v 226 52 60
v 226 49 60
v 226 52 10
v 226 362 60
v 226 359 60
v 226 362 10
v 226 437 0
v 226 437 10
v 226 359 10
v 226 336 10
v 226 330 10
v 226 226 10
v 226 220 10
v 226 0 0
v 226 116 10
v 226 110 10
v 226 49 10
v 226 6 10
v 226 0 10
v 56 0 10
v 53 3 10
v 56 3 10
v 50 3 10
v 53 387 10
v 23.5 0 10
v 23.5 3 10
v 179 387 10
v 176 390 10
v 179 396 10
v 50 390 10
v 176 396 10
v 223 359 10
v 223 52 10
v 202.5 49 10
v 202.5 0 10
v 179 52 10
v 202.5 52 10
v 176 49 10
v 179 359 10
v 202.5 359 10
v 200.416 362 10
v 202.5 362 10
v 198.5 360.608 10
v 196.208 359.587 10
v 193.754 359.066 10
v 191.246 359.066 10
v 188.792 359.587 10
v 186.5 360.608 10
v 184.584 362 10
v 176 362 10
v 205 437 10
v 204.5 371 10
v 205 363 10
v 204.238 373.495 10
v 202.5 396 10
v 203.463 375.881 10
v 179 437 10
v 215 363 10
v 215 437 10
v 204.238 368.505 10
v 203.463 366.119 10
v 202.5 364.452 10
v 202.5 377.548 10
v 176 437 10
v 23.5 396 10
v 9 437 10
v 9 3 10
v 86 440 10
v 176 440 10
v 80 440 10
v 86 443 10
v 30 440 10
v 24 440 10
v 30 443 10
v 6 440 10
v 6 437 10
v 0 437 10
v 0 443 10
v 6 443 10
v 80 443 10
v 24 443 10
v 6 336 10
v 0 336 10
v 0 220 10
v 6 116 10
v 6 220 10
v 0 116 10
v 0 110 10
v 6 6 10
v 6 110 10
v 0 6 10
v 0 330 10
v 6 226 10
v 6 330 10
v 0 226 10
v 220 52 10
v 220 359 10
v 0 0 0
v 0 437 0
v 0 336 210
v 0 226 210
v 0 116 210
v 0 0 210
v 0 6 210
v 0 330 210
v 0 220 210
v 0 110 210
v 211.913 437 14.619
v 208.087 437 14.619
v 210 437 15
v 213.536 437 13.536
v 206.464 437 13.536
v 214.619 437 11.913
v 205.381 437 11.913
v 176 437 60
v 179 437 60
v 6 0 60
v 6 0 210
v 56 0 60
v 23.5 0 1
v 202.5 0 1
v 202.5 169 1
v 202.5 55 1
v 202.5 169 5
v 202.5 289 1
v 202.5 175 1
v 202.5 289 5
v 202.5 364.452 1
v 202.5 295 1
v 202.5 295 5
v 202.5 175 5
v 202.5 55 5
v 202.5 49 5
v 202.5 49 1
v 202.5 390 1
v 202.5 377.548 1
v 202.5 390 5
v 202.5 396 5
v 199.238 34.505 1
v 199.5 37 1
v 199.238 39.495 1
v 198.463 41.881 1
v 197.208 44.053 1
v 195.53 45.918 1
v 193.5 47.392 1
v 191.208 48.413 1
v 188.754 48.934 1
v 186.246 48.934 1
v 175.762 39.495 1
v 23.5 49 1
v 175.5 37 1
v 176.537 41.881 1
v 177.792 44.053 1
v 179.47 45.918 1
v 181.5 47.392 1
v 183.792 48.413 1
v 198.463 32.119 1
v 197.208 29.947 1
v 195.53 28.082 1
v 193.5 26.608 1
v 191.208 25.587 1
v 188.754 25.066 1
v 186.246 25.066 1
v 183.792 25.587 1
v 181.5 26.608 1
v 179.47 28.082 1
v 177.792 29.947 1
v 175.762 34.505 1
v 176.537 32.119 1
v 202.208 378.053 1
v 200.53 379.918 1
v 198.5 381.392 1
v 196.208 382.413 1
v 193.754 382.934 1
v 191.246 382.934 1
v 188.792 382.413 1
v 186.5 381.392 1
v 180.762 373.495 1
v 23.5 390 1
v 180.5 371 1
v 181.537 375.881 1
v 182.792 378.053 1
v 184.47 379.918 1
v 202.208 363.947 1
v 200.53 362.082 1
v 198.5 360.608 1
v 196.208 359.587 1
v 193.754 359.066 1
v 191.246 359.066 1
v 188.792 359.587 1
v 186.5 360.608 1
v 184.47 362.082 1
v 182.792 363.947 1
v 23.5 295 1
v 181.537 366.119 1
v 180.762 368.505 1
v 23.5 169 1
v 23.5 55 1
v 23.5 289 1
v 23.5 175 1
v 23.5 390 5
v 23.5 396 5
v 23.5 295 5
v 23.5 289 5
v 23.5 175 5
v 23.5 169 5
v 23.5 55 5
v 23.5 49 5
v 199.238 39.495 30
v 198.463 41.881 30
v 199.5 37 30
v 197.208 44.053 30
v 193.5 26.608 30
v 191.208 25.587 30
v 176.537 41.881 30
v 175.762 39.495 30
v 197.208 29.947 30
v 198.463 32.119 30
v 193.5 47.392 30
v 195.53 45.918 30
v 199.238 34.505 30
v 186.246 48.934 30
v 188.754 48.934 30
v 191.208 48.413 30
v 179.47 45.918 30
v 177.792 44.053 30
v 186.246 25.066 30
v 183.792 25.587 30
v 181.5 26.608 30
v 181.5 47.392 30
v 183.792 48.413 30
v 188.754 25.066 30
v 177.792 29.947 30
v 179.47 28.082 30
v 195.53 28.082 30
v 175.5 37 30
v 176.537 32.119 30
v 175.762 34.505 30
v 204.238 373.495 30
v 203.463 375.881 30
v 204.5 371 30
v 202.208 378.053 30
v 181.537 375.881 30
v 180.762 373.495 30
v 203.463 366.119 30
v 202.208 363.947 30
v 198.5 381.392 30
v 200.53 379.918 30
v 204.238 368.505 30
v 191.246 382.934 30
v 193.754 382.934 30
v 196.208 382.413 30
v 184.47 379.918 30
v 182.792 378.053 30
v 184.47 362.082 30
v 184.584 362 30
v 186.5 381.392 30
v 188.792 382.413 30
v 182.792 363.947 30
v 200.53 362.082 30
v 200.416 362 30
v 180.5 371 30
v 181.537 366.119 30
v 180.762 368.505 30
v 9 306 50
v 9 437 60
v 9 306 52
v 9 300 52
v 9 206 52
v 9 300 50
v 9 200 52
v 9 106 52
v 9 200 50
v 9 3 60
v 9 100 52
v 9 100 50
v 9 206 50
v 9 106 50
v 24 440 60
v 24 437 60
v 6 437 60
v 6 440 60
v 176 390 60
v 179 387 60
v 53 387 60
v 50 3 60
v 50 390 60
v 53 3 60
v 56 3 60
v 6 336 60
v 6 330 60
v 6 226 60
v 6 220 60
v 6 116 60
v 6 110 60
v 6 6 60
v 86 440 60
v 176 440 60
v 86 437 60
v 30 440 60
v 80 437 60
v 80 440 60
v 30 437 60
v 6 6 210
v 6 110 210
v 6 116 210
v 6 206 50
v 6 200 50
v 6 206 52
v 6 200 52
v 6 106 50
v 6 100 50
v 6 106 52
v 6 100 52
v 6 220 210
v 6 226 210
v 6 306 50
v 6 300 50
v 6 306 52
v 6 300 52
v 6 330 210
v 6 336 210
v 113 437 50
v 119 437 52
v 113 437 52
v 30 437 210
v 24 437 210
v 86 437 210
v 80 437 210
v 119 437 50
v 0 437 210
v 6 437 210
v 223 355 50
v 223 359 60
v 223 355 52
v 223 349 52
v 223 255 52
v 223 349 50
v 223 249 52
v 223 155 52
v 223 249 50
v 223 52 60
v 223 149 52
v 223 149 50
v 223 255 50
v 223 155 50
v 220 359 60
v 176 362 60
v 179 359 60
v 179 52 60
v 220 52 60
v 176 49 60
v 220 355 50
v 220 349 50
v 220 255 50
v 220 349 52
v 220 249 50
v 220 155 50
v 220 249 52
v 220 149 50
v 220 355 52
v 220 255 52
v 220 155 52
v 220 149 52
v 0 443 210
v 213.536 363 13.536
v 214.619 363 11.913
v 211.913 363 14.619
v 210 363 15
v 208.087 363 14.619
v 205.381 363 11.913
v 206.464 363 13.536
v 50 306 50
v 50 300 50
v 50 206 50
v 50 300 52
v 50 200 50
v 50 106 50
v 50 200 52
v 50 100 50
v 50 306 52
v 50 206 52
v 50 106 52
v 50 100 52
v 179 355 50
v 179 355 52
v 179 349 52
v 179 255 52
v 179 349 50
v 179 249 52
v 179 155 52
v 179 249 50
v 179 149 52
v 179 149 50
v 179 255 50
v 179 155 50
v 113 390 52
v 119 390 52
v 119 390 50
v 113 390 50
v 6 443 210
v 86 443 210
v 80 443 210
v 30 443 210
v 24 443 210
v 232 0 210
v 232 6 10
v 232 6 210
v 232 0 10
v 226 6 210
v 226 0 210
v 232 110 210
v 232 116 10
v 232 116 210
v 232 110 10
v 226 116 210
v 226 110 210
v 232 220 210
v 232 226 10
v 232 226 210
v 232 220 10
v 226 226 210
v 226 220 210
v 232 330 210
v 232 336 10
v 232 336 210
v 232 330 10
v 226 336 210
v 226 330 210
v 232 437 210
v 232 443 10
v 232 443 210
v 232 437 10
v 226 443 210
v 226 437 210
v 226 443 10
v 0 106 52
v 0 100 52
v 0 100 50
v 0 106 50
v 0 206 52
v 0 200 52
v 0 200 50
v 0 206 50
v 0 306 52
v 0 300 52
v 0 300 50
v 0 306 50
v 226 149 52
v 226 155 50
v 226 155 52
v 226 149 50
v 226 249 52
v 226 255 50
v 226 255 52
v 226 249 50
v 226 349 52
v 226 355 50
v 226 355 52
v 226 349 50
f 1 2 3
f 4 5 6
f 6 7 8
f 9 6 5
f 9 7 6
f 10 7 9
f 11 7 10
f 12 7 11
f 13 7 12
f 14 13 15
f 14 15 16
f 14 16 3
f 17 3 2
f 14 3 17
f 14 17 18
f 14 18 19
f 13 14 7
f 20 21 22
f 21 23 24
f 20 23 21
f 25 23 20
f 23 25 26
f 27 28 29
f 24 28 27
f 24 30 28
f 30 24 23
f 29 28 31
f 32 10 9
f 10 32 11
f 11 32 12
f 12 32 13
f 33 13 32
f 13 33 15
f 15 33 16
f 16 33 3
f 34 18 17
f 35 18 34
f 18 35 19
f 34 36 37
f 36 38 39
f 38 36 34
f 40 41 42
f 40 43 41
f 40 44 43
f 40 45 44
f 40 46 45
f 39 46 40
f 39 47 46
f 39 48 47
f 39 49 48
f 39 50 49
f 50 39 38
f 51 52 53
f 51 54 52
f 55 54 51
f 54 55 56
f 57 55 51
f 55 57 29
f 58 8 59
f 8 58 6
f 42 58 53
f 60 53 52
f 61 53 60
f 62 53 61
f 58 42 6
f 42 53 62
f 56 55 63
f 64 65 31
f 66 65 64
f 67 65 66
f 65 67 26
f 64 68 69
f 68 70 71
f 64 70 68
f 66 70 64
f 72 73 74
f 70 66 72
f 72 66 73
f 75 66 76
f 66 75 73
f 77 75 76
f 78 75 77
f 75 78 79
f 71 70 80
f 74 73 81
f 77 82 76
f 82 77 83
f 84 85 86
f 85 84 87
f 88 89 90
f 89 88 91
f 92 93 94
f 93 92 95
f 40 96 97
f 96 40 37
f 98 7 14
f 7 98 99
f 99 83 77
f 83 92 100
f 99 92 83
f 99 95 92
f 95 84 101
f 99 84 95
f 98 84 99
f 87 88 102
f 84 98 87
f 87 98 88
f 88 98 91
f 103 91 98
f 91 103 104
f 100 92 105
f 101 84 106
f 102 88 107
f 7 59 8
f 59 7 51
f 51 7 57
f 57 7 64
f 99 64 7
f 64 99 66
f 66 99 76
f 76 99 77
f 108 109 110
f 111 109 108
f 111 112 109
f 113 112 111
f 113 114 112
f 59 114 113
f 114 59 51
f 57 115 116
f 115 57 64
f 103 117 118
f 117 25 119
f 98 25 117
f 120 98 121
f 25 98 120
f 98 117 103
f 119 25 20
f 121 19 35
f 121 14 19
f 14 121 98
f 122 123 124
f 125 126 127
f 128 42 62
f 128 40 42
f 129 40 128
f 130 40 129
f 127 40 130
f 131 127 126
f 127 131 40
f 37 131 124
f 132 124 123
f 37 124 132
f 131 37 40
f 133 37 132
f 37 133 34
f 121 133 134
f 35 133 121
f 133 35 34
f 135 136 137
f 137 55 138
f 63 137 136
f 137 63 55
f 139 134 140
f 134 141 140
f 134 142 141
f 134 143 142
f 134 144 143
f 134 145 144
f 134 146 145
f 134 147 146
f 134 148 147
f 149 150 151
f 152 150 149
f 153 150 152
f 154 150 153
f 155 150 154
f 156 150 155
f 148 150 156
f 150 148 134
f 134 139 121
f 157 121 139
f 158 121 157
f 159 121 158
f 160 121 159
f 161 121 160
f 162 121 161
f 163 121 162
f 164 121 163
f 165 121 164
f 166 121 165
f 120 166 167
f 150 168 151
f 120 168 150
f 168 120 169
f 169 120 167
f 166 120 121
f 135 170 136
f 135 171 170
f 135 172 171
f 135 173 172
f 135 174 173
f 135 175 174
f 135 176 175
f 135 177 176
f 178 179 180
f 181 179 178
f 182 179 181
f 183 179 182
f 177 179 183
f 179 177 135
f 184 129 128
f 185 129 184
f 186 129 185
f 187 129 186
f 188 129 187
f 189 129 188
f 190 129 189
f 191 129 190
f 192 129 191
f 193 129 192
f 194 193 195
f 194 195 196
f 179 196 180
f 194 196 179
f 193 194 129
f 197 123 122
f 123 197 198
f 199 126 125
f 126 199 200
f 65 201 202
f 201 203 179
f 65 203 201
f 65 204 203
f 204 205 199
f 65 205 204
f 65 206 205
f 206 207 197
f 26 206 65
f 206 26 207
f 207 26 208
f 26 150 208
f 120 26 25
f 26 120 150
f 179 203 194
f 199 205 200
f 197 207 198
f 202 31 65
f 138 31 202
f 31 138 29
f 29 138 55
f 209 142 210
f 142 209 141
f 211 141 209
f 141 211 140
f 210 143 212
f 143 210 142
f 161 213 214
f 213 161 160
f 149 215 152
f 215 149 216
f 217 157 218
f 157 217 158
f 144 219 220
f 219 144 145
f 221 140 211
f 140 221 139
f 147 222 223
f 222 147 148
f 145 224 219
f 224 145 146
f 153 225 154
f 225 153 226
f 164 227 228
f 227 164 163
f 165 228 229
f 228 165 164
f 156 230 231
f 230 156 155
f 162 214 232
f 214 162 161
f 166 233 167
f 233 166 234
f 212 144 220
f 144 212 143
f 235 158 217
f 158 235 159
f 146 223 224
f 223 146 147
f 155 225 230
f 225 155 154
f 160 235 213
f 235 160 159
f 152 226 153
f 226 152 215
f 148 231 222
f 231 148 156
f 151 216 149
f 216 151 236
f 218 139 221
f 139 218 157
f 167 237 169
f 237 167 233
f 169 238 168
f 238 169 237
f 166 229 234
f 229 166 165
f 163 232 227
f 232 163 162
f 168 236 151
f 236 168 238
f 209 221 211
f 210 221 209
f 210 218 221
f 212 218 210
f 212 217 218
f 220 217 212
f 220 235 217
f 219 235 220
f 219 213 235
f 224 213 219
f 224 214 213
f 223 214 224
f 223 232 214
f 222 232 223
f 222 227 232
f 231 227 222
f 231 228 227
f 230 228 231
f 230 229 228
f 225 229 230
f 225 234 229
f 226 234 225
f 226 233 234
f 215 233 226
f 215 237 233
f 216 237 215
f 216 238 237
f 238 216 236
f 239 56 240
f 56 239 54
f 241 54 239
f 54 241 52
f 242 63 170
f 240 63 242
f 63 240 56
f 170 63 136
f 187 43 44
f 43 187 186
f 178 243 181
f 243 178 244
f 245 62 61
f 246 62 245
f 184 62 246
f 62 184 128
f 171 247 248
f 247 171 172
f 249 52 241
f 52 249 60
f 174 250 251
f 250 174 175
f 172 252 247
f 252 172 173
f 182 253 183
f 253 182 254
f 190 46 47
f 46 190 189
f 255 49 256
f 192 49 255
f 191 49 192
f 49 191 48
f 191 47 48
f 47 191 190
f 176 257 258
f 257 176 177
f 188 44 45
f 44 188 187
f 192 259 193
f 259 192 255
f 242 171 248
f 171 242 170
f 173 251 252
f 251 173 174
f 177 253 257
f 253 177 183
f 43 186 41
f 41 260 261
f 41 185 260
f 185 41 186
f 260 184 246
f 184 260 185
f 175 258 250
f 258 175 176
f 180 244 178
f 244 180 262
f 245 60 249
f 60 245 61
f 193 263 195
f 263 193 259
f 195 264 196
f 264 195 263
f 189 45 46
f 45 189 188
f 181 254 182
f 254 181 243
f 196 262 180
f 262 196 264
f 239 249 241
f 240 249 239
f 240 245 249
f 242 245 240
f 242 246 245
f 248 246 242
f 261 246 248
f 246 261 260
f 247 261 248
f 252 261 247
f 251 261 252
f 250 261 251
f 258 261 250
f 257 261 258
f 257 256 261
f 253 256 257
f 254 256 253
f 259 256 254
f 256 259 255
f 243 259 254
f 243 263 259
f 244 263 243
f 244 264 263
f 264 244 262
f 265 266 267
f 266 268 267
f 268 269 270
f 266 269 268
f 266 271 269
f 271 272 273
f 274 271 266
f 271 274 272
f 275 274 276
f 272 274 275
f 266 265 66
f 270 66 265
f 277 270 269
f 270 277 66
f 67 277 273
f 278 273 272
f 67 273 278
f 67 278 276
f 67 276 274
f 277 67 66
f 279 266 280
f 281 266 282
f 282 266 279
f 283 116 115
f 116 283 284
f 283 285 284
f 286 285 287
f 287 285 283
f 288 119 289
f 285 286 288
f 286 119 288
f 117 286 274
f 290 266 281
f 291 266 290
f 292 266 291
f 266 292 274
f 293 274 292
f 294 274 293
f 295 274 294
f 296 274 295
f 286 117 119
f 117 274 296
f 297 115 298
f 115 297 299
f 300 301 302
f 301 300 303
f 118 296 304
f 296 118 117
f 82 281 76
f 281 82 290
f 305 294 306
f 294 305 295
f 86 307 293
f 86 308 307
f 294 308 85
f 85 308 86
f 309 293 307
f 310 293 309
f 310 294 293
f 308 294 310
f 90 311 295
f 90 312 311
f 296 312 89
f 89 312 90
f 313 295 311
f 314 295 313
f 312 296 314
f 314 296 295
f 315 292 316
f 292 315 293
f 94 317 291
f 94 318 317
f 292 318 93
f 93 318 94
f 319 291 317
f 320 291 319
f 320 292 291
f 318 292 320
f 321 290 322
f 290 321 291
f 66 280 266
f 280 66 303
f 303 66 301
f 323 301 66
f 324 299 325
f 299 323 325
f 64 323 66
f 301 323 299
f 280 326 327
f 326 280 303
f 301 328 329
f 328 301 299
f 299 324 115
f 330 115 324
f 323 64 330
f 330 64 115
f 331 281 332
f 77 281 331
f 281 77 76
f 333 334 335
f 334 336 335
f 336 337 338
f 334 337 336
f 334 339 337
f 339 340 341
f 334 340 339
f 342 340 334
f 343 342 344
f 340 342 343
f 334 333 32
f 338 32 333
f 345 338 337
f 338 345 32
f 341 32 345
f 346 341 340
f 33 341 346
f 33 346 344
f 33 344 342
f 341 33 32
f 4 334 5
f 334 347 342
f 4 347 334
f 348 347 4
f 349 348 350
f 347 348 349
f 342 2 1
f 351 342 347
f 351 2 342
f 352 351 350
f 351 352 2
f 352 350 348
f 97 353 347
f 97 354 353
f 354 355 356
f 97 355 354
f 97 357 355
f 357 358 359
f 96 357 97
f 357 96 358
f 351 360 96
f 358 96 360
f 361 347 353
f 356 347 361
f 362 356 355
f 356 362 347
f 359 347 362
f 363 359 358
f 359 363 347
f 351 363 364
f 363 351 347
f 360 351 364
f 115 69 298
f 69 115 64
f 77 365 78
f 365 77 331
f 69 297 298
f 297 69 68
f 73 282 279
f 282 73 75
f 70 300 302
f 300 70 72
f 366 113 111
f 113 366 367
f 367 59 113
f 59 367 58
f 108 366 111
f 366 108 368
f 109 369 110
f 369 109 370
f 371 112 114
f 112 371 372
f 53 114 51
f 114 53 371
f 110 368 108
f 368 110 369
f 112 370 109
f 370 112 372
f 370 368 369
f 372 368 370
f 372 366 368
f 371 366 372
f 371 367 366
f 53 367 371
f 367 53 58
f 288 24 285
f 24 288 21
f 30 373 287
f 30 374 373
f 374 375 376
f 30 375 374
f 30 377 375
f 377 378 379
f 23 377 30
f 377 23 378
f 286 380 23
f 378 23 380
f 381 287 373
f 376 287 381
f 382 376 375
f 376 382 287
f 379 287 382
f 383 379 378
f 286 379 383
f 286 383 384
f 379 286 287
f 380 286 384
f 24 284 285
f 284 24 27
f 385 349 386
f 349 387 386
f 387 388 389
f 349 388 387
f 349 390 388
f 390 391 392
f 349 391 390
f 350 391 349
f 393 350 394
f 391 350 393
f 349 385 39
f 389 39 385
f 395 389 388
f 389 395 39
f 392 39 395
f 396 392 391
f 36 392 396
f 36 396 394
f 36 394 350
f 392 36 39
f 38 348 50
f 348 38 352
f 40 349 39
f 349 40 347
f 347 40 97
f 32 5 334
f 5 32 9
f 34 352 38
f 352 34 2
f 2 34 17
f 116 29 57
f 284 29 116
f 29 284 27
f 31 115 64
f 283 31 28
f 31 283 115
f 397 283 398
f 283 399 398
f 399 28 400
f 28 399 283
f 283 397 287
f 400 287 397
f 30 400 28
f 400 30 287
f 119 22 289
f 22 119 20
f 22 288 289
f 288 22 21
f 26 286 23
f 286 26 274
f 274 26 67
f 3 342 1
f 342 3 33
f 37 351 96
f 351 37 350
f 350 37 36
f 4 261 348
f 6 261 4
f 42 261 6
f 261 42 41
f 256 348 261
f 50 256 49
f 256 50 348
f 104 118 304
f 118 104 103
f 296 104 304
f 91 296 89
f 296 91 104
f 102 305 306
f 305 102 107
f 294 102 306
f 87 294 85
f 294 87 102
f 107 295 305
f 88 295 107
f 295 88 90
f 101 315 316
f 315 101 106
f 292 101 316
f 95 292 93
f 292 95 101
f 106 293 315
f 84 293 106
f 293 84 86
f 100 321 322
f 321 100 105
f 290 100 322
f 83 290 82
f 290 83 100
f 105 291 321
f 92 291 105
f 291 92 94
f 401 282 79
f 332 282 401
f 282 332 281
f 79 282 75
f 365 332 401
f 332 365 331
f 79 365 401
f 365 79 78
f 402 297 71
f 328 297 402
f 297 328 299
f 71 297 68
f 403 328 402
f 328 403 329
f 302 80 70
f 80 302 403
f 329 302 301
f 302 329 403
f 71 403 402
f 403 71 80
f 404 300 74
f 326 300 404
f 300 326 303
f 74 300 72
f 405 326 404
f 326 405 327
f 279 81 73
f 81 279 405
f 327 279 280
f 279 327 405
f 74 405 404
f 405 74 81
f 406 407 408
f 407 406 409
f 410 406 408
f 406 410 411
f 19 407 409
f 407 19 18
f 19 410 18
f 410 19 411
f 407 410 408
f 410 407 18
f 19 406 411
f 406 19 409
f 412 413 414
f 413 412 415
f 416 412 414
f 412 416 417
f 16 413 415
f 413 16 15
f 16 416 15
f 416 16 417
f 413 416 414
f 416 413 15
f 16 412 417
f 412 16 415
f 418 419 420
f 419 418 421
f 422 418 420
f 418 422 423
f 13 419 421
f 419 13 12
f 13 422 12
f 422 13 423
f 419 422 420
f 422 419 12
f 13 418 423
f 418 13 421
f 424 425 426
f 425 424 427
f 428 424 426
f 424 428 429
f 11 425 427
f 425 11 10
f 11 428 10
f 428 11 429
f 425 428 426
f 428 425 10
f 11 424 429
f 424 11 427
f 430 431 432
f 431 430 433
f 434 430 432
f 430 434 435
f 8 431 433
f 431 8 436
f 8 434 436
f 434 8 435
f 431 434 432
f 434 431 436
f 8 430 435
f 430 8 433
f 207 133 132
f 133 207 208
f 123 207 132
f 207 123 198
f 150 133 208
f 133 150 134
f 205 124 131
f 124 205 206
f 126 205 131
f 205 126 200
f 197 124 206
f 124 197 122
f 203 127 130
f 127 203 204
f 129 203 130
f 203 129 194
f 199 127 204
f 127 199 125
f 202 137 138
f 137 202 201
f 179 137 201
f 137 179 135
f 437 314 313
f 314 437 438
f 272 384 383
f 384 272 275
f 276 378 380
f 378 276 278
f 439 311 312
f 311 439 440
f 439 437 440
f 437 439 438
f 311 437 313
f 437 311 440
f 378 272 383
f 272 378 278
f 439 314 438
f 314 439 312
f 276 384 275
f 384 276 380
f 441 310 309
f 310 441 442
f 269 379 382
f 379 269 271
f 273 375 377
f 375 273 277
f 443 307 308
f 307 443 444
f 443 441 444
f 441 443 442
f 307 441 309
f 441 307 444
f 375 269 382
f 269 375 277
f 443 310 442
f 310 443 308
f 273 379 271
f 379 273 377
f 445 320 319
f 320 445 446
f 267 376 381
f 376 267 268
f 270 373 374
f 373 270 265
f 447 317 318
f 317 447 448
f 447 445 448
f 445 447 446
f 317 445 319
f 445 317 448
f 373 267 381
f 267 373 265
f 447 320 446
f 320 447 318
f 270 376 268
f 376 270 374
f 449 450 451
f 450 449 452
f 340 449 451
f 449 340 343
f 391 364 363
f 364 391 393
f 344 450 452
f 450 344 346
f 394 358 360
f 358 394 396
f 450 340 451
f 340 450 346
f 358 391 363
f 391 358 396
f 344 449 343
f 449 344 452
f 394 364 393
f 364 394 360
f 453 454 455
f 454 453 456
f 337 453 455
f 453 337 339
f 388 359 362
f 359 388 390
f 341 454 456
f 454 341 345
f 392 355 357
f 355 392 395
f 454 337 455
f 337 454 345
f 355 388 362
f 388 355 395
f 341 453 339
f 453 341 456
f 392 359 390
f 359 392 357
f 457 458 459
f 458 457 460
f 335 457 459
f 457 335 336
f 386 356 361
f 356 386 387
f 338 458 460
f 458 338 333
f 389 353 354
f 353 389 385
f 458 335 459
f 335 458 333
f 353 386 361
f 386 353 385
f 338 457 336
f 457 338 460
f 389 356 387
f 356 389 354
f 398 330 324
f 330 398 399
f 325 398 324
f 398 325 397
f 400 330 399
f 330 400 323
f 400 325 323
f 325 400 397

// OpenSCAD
//note that width of boards largely isn't figured in yet

hr = 10; //est. height of metal rim
ht = 5; //est. height of wood tiles

/* structural */
difference(){
	color("red"){cube([226,437,hr], false);}
	translate([(226-179)/2,0,1]){
		cube([179,396,hr]);}
}
wRRim = 21.5; //width of rim on R side
wFRim = 27.5; //width of rim on far side
rVent = 12; //radius of the vents
hVent = 30; //height of vents is a guess
vent1ToWall = 25;
vent2ToEdge = 26.5;
translate([226-(wRRim+5+rVent),vent1ToWall+rVent,0]){
	cylinder(hVent,rVent,rVent);}
translate([226-(wRRim+rVent),437-(wFRim+vent2ToEdge+rVent),0]){
	cylinder(hVent,rVent,rVent);}
topVent1 = vent1ToWall + 2*rVent;
bottVent2 = vent2ToEdge + 2*rVent;
insideVent2 = 2*rVent; //vent2 is adjacent to the R edge

/* walls for containers */
//TODO measure containers
hc = 40; //height container
wc = 50; //width container
lc = 100; //length container
translate([6,0,hr]){
	color("blue"){cube([3,437,hc+hr]);}}
translate([(226-6),vent2ToEdge+2*rVent,hr]){
	color("blue"){cube([3,310,hc+hr]);}}
translate([0,437,hr]){
	color("blue"){cube([226-(wc),3,hc+hr]);}}
//drainage pipe
translate([210,437,hr]){
	rotate([90,0,0]){
	cylinder(wc+2*rVent,5,5);}}

translate([wc,0,hr]){
	color("blue"){cube([3,(437-wc),hc+hr]);}}
translate([226-wc,topVent1,hr]){
	color("blue"){cube([3,310,hc+hr]);}}
translate([226-wc,437-wc,hr]){
	color("blue"){cube([3,wc,hc+hr]);}}
translate([wc,(437-wc),hr]){
	color("blue"){cube([(226-wc*2),3,hc+hr]);}}

translate([6,0,hr]){
	color("blue"){cube([wc,3,hc+hr]);}}
translate([226-wc,topVent1,hr]){
	color("blue"){cube([wc,3,hc+hr]);}}
translate([226-wc,437-(wFRim + vent2ToEdge + rVent*2),hr]){
	color("blue"){cube([wc,3,hc+hr]);}}


/* vertical supports for trellis */
translate([0,0,hr]){
	color("purple"){cube([6,6,200]);}}
translate([0,110,hr]){
	color("purple"){cube([6,6,200]);}}
translate([0,220,hr]){
	color("purple"){cube([6,6,200]);}}
translate([0,330,hr]){
	color("purple"){cube([6,6,200]);}}
translate([0,437,hr]){
	color("purple"){cube([6,6,200]);}}
translate([80,437,hr]){
	color("purple"){cube([6,6,200]);}}
translate([insideVent2,437,hr]){
	color("purple"){cube([6,6,200]);}}
translate([226,0,hr]){
	color("purple"){cube([6,6,200]);}}
translate([226,110,hr]){
	color("purple"){cube([6,6,200]);}}
translate([226,220,hr]){
	color("purple"){cube([6,6,200]);}}
translate([226,330,hr]){
	color("purple"){cube([6,6,200]);}}
translate([226,437,hr]){
	color("purple"){cube([6,6,200]);}}

/* floor beams */
translate([(226-179)/2,topVent1,0]){
	color("purple"){cube([179,6,5]);}}
translate([(226-179)/2,topVent1+120,0]){
	color("purple"){cube([179,6,5]);}}
translate([(226-179)/2,topVent1+240,0]){
	color("purple"){cube([179,6,5]);}}
translate([(226-179)/2,396-6,0]){
	color("purple"){cube([179,10,5]);}}
//note that we may need two boards or one wider board for the last one
//adjust distance between boards so they fit well with tiles

/* connect walls */
//position will depend on length of container
translate([0,lc,hr+hc]){
	color("silver"){cube([wc,6,2]);}}
translate([0,2*lc,hr+hc]){
	color("silver"){cube([wc,6,2]);}}
translate([0,3*lc,hr+hc]){
	color("silver"){cube([wc,6,2]);}}
translate([226-wc,topVent1+lc,hr+hc]){
	color("silver"){cube([wc,6,2]);}}
translate([226-wc,topVent1+2*lc,hr+hc]){
	color("silver"){cube([wc,6,2]);}}
translate([226-wc,topVent1+3*lc,hr+hc]){
	color("silver"){cube([wc,6,2]);}}
translate([226/2,437-wc,hr+hc]){
	color("silver"){cube([6,wc,2]);}}

//TODO decide what we're doing with vent2: just form a cut-out around it, or make that an exit to a walkway (or potential walkway) over the top of bike sheds
//TODO containers will have floor as well, but it is easier to see what's going on if I don't add it now.
//TODO plan to adjust height of floor so water drains correctly (into our yard). If we go with a two-container plan, consider how to drain R container

/* BOM
   flooring
   floor beams
   bottoms
   outsides
   insides
   tiles
next year:   
   vertical supports
   fencing/trellis
*/
